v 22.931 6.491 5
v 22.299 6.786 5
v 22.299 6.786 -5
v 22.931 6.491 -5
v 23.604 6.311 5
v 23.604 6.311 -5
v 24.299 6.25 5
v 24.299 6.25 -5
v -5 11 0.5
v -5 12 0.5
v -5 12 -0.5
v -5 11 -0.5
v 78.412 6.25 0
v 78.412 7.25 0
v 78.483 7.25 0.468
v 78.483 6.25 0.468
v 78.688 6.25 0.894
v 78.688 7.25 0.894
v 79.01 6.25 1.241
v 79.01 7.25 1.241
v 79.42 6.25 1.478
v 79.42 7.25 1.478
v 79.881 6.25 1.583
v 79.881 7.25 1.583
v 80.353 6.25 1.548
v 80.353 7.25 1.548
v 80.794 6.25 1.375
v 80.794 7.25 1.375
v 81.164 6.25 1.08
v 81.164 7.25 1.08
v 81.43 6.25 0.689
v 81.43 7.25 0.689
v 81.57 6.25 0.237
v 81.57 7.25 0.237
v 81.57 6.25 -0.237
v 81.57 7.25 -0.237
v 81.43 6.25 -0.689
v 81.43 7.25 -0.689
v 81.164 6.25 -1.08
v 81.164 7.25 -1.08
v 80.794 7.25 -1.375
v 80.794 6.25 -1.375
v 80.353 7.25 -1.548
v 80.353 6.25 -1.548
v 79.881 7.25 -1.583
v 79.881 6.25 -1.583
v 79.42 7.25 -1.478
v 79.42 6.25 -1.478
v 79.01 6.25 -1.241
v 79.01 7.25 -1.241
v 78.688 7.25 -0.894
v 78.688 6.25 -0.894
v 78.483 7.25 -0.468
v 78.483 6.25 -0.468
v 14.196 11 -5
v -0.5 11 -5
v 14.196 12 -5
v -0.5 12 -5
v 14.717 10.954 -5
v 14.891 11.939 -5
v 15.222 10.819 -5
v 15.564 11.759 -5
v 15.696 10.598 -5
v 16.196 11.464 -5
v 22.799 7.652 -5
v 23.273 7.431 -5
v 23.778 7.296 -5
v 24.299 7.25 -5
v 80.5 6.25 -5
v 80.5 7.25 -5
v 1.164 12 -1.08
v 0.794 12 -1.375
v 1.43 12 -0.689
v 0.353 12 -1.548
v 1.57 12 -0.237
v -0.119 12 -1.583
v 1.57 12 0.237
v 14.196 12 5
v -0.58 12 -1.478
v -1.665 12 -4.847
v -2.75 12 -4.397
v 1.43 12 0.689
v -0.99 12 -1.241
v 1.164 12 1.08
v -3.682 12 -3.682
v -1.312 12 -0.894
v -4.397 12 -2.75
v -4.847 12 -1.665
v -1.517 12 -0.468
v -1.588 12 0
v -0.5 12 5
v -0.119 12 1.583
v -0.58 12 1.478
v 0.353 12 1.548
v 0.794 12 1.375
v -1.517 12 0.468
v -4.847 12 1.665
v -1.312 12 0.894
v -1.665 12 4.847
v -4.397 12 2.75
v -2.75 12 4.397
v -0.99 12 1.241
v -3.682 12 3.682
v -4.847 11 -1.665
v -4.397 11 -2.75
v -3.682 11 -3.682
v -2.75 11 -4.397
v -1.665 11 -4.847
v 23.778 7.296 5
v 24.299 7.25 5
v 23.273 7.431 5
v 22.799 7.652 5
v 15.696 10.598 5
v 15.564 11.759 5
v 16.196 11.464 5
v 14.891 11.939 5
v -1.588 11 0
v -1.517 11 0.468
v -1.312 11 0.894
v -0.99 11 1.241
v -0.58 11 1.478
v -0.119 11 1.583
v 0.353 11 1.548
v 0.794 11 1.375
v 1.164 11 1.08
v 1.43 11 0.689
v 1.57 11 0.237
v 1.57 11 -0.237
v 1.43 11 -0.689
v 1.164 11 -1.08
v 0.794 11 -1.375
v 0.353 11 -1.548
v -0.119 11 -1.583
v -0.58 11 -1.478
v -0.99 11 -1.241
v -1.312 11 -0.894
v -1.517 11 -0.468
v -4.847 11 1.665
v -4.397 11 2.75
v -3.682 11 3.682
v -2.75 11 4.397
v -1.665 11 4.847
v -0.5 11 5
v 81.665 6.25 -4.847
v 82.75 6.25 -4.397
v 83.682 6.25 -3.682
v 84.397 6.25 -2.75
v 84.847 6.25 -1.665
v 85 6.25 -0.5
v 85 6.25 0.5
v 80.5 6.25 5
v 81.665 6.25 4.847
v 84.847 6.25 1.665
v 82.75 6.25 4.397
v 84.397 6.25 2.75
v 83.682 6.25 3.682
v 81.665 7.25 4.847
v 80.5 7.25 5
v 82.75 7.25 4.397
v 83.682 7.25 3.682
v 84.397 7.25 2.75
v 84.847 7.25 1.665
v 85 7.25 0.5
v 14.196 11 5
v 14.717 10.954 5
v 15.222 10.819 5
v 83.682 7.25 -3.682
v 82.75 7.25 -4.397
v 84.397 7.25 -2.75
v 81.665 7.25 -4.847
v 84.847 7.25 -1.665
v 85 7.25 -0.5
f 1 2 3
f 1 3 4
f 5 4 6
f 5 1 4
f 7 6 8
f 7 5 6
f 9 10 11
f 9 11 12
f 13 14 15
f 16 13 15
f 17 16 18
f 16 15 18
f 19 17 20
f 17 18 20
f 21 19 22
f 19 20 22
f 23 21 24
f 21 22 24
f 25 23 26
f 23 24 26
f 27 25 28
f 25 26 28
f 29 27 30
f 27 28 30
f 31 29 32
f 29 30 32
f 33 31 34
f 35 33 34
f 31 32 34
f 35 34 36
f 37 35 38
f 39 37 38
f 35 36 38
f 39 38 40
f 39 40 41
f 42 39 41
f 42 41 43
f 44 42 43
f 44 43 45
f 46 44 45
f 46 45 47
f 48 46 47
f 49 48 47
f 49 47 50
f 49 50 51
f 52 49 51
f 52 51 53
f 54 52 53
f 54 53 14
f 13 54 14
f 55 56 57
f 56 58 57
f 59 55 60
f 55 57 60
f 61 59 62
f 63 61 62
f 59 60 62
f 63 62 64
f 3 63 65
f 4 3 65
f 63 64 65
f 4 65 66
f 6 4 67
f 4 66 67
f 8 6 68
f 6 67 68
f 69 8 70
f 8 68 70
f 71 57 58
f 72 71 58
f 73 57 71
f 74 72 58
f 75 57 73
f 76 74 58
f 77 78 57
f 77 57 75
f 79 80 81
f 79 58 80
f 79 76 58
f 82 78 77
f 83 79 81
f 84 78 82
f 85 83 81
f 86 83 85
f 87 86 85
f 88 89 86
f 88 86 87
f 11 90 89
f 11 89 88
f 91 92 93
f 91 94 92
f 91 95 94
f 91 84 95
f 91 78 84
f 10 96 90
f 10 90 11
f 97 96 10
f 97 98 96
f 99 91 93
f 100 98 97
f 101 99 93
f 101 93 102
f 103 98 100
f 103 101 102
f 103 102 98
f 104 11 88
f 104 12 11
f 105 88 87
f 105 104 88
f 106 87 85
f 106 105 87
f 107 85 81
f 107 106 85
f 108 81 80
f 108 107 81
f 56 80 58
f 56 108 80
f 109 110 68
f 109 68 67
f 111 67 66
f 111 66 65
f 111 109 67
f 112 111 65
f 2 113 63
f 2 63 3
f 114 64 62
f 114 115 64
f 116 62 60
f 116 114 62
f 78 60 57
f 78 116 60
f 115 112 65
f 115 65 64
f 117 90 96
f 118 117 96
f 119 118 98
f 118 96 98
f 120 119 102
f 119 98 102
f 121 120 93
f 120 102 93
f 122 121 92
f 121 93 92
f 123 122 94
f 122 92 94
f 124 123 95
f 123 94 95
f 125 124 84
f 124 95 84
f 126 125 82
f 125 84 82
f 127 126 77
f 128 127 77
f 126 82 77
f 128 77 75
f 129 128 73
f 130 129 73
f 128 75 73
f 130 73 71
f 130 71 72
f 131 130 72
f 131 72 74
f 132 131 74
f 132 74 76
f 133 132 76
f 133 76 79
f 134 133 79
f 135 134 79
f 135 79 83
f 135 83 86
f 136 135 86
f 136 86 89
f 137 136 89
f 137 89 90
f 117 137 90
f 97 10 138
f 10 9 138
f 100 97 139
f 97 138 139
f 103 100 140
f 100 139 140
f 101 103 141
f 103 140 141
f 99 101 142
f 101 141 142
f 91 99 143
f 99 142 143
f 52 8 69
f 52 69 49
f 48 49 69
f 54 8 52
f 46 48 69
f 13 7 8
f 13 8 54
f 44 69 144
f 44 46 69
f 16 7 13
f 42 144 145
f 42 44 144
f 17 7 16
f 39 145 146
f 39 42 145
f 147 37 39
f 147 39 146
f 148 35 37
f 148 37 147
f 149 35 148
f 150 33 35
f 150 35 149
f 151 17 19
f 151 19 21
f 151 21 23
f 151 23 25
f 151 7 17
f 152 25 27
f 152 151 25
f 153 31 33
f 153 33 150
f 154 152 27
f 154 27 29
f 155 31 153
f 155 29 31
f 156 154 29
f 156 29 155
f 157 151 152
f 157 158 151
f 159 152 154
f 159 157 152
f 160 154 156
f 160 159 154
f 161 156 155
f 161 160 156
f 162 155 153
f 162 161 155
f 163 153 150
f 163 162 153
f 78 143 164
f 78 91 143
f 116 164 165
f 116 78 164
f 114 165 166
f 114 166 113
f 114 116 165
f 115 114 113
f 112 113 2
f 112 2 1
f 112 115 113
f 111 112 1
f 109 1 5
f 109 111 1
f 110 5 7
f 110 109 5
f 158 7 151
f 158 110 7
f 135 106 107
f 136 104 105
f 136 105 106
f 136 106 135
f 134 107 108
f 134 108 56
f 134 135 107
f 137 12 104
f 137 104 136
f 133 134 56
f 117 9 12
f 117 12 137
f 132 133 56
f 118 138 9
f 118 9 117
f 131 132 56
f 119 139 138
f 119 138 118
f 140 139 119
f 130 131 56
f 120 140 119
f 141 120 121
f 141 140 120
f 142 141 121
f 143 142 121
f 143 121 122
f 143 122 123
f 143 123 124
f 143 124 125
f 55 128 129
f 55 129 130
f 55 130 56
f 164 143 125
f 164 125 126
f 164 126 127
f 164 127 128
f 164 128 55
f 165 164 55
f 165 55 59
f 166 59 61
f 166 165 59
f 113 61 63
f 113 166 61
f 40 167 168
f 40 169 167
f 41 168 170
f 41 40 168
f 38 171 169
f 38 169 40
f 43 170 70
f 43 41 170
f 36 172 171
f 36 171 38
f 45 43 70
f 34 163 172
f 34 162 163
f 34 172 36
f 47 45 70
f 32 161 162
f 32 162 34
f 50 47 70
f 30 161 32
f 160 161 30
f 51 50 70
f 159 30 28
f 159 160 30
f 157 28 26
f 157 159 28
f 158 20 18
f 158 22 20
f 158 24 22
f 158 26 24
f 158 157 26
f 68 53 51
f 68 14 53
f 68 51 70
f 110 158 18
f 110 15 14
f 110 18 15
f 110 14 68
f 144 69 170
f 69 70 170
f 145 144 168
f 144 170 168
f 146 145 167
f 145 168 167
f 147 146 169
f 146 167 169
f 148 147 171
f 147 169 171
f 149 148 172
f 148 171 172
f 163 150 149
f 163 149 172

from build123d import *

# Parameters (mm, degrees)
F1_DEPTH = 5
F3_D     = 3.175
F4_R     = 4.5


with BuildPart() as f1:
    # F0 (on Top) → F1 (new body, symmetric)
    with BuildSketch(Plane.XY):
        with BuildLine():
            Line((-5, 12), (-5, 11))
            Line((-5, 11), (14.196152, 11))
            ThreePointArc((14.196152, 11), (14.97261, 10.897777), (15.696152, 10.598076))
            Line((15.696152, 10.598076), (22.299038, 6.785898))
            ThreePointArc((22.299038, 6.785898), (23.263762, 6.386297), (24.299038, 6.25))
            Line((24.299038, 6.25), (85, 6.25))
            Line((85, 6.25), (85, 7.25))
            Line((85, 7.25), (24.299038, 7.25))
            ThreePointArc((24.299038, 7.25), (23.522581, 7.352223), (22.799038, 7.651924))
            Line((22.799038, 7.651924), (16.196152, 11.464102))
            ThreePointArc((16.196152, 11.464102), (15.231429, 11.863703), (14.196152, 12))
            Line((14.196152, 12), (-5, 12))
        make_face()
    extrude(amount=F1_DEPTH, both=True)

    # F3 (through all)
    with Locations(Plane.XZ):
        with Locations((0, 0), (80, 0)):
            Hole(F3_D / 2)

    # F4
    f4_edges = [f1.edges().sort_by_distance(p)[0] for p in [
        (85, 6.75, 5),
        (85, 6.75, -5),
        (-5, 11.5, 5),
        (-5, 11.5, -5),
    ]]
    fillet(f4_edges, radius=F4_R)


solid = f1.part
